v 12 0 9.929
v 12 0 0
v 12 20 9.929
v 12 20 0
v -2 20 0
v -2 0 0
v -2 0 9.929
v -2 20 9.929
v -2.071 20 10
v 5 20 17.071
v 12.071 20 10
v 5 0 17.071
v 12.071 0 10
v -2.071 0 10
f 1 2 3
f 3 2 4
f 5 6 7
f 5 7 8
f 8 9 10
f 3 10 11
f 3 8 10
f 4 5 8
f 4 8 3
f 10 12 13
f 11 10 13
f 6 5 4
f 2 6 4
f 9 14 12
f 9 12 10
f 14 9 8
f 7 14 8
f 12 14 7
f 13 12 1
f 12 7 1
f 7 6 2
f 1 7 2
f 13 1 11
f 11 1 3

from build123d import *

# Parameters (mm, degrees)
BOX001_W            = 14
BOX001_H            = 20
BOX001_DEPTH        = 10
BOX_W               = 10
BOX_H               = 20
BOX_DEPTH           = 10
BOX_PLACEMENT_ANGLE = 45


with BuildPart() as cubo001:
    # Box001 → Box001 (new body)
    with BuildSketch(Plane(origin=(-2, 0, 0), x_dir=(1, 0, 0), z_dir=(0, 0, 1))):
        with Locations((7, 10)):
            Rectangle(BOX001_W, BOX001_H)
    extrude(amount=BOX001_DEPTH)


with BuildPart() as fusion:
    # Box → Box (new body)
    with BuildSketch(Plane.XY):
        with Locations((5, 10)):
            Rectangle(BOX_W, BOX_H)
    extrude(amount=BOX_DEPTH)


with BuildPart() as fusion_1:
    # Box placement: moved
    add(fusion.part.moved(Location((-2.071068, 0, 10))).rotate(Axis((-2.071068, 0, 10), (0, 1, 0)), BOX_PLACEMENT_ANGLE))

    # Fusion: union Cubo001
    add(cubo001.part)


solid = fusion_1.part
